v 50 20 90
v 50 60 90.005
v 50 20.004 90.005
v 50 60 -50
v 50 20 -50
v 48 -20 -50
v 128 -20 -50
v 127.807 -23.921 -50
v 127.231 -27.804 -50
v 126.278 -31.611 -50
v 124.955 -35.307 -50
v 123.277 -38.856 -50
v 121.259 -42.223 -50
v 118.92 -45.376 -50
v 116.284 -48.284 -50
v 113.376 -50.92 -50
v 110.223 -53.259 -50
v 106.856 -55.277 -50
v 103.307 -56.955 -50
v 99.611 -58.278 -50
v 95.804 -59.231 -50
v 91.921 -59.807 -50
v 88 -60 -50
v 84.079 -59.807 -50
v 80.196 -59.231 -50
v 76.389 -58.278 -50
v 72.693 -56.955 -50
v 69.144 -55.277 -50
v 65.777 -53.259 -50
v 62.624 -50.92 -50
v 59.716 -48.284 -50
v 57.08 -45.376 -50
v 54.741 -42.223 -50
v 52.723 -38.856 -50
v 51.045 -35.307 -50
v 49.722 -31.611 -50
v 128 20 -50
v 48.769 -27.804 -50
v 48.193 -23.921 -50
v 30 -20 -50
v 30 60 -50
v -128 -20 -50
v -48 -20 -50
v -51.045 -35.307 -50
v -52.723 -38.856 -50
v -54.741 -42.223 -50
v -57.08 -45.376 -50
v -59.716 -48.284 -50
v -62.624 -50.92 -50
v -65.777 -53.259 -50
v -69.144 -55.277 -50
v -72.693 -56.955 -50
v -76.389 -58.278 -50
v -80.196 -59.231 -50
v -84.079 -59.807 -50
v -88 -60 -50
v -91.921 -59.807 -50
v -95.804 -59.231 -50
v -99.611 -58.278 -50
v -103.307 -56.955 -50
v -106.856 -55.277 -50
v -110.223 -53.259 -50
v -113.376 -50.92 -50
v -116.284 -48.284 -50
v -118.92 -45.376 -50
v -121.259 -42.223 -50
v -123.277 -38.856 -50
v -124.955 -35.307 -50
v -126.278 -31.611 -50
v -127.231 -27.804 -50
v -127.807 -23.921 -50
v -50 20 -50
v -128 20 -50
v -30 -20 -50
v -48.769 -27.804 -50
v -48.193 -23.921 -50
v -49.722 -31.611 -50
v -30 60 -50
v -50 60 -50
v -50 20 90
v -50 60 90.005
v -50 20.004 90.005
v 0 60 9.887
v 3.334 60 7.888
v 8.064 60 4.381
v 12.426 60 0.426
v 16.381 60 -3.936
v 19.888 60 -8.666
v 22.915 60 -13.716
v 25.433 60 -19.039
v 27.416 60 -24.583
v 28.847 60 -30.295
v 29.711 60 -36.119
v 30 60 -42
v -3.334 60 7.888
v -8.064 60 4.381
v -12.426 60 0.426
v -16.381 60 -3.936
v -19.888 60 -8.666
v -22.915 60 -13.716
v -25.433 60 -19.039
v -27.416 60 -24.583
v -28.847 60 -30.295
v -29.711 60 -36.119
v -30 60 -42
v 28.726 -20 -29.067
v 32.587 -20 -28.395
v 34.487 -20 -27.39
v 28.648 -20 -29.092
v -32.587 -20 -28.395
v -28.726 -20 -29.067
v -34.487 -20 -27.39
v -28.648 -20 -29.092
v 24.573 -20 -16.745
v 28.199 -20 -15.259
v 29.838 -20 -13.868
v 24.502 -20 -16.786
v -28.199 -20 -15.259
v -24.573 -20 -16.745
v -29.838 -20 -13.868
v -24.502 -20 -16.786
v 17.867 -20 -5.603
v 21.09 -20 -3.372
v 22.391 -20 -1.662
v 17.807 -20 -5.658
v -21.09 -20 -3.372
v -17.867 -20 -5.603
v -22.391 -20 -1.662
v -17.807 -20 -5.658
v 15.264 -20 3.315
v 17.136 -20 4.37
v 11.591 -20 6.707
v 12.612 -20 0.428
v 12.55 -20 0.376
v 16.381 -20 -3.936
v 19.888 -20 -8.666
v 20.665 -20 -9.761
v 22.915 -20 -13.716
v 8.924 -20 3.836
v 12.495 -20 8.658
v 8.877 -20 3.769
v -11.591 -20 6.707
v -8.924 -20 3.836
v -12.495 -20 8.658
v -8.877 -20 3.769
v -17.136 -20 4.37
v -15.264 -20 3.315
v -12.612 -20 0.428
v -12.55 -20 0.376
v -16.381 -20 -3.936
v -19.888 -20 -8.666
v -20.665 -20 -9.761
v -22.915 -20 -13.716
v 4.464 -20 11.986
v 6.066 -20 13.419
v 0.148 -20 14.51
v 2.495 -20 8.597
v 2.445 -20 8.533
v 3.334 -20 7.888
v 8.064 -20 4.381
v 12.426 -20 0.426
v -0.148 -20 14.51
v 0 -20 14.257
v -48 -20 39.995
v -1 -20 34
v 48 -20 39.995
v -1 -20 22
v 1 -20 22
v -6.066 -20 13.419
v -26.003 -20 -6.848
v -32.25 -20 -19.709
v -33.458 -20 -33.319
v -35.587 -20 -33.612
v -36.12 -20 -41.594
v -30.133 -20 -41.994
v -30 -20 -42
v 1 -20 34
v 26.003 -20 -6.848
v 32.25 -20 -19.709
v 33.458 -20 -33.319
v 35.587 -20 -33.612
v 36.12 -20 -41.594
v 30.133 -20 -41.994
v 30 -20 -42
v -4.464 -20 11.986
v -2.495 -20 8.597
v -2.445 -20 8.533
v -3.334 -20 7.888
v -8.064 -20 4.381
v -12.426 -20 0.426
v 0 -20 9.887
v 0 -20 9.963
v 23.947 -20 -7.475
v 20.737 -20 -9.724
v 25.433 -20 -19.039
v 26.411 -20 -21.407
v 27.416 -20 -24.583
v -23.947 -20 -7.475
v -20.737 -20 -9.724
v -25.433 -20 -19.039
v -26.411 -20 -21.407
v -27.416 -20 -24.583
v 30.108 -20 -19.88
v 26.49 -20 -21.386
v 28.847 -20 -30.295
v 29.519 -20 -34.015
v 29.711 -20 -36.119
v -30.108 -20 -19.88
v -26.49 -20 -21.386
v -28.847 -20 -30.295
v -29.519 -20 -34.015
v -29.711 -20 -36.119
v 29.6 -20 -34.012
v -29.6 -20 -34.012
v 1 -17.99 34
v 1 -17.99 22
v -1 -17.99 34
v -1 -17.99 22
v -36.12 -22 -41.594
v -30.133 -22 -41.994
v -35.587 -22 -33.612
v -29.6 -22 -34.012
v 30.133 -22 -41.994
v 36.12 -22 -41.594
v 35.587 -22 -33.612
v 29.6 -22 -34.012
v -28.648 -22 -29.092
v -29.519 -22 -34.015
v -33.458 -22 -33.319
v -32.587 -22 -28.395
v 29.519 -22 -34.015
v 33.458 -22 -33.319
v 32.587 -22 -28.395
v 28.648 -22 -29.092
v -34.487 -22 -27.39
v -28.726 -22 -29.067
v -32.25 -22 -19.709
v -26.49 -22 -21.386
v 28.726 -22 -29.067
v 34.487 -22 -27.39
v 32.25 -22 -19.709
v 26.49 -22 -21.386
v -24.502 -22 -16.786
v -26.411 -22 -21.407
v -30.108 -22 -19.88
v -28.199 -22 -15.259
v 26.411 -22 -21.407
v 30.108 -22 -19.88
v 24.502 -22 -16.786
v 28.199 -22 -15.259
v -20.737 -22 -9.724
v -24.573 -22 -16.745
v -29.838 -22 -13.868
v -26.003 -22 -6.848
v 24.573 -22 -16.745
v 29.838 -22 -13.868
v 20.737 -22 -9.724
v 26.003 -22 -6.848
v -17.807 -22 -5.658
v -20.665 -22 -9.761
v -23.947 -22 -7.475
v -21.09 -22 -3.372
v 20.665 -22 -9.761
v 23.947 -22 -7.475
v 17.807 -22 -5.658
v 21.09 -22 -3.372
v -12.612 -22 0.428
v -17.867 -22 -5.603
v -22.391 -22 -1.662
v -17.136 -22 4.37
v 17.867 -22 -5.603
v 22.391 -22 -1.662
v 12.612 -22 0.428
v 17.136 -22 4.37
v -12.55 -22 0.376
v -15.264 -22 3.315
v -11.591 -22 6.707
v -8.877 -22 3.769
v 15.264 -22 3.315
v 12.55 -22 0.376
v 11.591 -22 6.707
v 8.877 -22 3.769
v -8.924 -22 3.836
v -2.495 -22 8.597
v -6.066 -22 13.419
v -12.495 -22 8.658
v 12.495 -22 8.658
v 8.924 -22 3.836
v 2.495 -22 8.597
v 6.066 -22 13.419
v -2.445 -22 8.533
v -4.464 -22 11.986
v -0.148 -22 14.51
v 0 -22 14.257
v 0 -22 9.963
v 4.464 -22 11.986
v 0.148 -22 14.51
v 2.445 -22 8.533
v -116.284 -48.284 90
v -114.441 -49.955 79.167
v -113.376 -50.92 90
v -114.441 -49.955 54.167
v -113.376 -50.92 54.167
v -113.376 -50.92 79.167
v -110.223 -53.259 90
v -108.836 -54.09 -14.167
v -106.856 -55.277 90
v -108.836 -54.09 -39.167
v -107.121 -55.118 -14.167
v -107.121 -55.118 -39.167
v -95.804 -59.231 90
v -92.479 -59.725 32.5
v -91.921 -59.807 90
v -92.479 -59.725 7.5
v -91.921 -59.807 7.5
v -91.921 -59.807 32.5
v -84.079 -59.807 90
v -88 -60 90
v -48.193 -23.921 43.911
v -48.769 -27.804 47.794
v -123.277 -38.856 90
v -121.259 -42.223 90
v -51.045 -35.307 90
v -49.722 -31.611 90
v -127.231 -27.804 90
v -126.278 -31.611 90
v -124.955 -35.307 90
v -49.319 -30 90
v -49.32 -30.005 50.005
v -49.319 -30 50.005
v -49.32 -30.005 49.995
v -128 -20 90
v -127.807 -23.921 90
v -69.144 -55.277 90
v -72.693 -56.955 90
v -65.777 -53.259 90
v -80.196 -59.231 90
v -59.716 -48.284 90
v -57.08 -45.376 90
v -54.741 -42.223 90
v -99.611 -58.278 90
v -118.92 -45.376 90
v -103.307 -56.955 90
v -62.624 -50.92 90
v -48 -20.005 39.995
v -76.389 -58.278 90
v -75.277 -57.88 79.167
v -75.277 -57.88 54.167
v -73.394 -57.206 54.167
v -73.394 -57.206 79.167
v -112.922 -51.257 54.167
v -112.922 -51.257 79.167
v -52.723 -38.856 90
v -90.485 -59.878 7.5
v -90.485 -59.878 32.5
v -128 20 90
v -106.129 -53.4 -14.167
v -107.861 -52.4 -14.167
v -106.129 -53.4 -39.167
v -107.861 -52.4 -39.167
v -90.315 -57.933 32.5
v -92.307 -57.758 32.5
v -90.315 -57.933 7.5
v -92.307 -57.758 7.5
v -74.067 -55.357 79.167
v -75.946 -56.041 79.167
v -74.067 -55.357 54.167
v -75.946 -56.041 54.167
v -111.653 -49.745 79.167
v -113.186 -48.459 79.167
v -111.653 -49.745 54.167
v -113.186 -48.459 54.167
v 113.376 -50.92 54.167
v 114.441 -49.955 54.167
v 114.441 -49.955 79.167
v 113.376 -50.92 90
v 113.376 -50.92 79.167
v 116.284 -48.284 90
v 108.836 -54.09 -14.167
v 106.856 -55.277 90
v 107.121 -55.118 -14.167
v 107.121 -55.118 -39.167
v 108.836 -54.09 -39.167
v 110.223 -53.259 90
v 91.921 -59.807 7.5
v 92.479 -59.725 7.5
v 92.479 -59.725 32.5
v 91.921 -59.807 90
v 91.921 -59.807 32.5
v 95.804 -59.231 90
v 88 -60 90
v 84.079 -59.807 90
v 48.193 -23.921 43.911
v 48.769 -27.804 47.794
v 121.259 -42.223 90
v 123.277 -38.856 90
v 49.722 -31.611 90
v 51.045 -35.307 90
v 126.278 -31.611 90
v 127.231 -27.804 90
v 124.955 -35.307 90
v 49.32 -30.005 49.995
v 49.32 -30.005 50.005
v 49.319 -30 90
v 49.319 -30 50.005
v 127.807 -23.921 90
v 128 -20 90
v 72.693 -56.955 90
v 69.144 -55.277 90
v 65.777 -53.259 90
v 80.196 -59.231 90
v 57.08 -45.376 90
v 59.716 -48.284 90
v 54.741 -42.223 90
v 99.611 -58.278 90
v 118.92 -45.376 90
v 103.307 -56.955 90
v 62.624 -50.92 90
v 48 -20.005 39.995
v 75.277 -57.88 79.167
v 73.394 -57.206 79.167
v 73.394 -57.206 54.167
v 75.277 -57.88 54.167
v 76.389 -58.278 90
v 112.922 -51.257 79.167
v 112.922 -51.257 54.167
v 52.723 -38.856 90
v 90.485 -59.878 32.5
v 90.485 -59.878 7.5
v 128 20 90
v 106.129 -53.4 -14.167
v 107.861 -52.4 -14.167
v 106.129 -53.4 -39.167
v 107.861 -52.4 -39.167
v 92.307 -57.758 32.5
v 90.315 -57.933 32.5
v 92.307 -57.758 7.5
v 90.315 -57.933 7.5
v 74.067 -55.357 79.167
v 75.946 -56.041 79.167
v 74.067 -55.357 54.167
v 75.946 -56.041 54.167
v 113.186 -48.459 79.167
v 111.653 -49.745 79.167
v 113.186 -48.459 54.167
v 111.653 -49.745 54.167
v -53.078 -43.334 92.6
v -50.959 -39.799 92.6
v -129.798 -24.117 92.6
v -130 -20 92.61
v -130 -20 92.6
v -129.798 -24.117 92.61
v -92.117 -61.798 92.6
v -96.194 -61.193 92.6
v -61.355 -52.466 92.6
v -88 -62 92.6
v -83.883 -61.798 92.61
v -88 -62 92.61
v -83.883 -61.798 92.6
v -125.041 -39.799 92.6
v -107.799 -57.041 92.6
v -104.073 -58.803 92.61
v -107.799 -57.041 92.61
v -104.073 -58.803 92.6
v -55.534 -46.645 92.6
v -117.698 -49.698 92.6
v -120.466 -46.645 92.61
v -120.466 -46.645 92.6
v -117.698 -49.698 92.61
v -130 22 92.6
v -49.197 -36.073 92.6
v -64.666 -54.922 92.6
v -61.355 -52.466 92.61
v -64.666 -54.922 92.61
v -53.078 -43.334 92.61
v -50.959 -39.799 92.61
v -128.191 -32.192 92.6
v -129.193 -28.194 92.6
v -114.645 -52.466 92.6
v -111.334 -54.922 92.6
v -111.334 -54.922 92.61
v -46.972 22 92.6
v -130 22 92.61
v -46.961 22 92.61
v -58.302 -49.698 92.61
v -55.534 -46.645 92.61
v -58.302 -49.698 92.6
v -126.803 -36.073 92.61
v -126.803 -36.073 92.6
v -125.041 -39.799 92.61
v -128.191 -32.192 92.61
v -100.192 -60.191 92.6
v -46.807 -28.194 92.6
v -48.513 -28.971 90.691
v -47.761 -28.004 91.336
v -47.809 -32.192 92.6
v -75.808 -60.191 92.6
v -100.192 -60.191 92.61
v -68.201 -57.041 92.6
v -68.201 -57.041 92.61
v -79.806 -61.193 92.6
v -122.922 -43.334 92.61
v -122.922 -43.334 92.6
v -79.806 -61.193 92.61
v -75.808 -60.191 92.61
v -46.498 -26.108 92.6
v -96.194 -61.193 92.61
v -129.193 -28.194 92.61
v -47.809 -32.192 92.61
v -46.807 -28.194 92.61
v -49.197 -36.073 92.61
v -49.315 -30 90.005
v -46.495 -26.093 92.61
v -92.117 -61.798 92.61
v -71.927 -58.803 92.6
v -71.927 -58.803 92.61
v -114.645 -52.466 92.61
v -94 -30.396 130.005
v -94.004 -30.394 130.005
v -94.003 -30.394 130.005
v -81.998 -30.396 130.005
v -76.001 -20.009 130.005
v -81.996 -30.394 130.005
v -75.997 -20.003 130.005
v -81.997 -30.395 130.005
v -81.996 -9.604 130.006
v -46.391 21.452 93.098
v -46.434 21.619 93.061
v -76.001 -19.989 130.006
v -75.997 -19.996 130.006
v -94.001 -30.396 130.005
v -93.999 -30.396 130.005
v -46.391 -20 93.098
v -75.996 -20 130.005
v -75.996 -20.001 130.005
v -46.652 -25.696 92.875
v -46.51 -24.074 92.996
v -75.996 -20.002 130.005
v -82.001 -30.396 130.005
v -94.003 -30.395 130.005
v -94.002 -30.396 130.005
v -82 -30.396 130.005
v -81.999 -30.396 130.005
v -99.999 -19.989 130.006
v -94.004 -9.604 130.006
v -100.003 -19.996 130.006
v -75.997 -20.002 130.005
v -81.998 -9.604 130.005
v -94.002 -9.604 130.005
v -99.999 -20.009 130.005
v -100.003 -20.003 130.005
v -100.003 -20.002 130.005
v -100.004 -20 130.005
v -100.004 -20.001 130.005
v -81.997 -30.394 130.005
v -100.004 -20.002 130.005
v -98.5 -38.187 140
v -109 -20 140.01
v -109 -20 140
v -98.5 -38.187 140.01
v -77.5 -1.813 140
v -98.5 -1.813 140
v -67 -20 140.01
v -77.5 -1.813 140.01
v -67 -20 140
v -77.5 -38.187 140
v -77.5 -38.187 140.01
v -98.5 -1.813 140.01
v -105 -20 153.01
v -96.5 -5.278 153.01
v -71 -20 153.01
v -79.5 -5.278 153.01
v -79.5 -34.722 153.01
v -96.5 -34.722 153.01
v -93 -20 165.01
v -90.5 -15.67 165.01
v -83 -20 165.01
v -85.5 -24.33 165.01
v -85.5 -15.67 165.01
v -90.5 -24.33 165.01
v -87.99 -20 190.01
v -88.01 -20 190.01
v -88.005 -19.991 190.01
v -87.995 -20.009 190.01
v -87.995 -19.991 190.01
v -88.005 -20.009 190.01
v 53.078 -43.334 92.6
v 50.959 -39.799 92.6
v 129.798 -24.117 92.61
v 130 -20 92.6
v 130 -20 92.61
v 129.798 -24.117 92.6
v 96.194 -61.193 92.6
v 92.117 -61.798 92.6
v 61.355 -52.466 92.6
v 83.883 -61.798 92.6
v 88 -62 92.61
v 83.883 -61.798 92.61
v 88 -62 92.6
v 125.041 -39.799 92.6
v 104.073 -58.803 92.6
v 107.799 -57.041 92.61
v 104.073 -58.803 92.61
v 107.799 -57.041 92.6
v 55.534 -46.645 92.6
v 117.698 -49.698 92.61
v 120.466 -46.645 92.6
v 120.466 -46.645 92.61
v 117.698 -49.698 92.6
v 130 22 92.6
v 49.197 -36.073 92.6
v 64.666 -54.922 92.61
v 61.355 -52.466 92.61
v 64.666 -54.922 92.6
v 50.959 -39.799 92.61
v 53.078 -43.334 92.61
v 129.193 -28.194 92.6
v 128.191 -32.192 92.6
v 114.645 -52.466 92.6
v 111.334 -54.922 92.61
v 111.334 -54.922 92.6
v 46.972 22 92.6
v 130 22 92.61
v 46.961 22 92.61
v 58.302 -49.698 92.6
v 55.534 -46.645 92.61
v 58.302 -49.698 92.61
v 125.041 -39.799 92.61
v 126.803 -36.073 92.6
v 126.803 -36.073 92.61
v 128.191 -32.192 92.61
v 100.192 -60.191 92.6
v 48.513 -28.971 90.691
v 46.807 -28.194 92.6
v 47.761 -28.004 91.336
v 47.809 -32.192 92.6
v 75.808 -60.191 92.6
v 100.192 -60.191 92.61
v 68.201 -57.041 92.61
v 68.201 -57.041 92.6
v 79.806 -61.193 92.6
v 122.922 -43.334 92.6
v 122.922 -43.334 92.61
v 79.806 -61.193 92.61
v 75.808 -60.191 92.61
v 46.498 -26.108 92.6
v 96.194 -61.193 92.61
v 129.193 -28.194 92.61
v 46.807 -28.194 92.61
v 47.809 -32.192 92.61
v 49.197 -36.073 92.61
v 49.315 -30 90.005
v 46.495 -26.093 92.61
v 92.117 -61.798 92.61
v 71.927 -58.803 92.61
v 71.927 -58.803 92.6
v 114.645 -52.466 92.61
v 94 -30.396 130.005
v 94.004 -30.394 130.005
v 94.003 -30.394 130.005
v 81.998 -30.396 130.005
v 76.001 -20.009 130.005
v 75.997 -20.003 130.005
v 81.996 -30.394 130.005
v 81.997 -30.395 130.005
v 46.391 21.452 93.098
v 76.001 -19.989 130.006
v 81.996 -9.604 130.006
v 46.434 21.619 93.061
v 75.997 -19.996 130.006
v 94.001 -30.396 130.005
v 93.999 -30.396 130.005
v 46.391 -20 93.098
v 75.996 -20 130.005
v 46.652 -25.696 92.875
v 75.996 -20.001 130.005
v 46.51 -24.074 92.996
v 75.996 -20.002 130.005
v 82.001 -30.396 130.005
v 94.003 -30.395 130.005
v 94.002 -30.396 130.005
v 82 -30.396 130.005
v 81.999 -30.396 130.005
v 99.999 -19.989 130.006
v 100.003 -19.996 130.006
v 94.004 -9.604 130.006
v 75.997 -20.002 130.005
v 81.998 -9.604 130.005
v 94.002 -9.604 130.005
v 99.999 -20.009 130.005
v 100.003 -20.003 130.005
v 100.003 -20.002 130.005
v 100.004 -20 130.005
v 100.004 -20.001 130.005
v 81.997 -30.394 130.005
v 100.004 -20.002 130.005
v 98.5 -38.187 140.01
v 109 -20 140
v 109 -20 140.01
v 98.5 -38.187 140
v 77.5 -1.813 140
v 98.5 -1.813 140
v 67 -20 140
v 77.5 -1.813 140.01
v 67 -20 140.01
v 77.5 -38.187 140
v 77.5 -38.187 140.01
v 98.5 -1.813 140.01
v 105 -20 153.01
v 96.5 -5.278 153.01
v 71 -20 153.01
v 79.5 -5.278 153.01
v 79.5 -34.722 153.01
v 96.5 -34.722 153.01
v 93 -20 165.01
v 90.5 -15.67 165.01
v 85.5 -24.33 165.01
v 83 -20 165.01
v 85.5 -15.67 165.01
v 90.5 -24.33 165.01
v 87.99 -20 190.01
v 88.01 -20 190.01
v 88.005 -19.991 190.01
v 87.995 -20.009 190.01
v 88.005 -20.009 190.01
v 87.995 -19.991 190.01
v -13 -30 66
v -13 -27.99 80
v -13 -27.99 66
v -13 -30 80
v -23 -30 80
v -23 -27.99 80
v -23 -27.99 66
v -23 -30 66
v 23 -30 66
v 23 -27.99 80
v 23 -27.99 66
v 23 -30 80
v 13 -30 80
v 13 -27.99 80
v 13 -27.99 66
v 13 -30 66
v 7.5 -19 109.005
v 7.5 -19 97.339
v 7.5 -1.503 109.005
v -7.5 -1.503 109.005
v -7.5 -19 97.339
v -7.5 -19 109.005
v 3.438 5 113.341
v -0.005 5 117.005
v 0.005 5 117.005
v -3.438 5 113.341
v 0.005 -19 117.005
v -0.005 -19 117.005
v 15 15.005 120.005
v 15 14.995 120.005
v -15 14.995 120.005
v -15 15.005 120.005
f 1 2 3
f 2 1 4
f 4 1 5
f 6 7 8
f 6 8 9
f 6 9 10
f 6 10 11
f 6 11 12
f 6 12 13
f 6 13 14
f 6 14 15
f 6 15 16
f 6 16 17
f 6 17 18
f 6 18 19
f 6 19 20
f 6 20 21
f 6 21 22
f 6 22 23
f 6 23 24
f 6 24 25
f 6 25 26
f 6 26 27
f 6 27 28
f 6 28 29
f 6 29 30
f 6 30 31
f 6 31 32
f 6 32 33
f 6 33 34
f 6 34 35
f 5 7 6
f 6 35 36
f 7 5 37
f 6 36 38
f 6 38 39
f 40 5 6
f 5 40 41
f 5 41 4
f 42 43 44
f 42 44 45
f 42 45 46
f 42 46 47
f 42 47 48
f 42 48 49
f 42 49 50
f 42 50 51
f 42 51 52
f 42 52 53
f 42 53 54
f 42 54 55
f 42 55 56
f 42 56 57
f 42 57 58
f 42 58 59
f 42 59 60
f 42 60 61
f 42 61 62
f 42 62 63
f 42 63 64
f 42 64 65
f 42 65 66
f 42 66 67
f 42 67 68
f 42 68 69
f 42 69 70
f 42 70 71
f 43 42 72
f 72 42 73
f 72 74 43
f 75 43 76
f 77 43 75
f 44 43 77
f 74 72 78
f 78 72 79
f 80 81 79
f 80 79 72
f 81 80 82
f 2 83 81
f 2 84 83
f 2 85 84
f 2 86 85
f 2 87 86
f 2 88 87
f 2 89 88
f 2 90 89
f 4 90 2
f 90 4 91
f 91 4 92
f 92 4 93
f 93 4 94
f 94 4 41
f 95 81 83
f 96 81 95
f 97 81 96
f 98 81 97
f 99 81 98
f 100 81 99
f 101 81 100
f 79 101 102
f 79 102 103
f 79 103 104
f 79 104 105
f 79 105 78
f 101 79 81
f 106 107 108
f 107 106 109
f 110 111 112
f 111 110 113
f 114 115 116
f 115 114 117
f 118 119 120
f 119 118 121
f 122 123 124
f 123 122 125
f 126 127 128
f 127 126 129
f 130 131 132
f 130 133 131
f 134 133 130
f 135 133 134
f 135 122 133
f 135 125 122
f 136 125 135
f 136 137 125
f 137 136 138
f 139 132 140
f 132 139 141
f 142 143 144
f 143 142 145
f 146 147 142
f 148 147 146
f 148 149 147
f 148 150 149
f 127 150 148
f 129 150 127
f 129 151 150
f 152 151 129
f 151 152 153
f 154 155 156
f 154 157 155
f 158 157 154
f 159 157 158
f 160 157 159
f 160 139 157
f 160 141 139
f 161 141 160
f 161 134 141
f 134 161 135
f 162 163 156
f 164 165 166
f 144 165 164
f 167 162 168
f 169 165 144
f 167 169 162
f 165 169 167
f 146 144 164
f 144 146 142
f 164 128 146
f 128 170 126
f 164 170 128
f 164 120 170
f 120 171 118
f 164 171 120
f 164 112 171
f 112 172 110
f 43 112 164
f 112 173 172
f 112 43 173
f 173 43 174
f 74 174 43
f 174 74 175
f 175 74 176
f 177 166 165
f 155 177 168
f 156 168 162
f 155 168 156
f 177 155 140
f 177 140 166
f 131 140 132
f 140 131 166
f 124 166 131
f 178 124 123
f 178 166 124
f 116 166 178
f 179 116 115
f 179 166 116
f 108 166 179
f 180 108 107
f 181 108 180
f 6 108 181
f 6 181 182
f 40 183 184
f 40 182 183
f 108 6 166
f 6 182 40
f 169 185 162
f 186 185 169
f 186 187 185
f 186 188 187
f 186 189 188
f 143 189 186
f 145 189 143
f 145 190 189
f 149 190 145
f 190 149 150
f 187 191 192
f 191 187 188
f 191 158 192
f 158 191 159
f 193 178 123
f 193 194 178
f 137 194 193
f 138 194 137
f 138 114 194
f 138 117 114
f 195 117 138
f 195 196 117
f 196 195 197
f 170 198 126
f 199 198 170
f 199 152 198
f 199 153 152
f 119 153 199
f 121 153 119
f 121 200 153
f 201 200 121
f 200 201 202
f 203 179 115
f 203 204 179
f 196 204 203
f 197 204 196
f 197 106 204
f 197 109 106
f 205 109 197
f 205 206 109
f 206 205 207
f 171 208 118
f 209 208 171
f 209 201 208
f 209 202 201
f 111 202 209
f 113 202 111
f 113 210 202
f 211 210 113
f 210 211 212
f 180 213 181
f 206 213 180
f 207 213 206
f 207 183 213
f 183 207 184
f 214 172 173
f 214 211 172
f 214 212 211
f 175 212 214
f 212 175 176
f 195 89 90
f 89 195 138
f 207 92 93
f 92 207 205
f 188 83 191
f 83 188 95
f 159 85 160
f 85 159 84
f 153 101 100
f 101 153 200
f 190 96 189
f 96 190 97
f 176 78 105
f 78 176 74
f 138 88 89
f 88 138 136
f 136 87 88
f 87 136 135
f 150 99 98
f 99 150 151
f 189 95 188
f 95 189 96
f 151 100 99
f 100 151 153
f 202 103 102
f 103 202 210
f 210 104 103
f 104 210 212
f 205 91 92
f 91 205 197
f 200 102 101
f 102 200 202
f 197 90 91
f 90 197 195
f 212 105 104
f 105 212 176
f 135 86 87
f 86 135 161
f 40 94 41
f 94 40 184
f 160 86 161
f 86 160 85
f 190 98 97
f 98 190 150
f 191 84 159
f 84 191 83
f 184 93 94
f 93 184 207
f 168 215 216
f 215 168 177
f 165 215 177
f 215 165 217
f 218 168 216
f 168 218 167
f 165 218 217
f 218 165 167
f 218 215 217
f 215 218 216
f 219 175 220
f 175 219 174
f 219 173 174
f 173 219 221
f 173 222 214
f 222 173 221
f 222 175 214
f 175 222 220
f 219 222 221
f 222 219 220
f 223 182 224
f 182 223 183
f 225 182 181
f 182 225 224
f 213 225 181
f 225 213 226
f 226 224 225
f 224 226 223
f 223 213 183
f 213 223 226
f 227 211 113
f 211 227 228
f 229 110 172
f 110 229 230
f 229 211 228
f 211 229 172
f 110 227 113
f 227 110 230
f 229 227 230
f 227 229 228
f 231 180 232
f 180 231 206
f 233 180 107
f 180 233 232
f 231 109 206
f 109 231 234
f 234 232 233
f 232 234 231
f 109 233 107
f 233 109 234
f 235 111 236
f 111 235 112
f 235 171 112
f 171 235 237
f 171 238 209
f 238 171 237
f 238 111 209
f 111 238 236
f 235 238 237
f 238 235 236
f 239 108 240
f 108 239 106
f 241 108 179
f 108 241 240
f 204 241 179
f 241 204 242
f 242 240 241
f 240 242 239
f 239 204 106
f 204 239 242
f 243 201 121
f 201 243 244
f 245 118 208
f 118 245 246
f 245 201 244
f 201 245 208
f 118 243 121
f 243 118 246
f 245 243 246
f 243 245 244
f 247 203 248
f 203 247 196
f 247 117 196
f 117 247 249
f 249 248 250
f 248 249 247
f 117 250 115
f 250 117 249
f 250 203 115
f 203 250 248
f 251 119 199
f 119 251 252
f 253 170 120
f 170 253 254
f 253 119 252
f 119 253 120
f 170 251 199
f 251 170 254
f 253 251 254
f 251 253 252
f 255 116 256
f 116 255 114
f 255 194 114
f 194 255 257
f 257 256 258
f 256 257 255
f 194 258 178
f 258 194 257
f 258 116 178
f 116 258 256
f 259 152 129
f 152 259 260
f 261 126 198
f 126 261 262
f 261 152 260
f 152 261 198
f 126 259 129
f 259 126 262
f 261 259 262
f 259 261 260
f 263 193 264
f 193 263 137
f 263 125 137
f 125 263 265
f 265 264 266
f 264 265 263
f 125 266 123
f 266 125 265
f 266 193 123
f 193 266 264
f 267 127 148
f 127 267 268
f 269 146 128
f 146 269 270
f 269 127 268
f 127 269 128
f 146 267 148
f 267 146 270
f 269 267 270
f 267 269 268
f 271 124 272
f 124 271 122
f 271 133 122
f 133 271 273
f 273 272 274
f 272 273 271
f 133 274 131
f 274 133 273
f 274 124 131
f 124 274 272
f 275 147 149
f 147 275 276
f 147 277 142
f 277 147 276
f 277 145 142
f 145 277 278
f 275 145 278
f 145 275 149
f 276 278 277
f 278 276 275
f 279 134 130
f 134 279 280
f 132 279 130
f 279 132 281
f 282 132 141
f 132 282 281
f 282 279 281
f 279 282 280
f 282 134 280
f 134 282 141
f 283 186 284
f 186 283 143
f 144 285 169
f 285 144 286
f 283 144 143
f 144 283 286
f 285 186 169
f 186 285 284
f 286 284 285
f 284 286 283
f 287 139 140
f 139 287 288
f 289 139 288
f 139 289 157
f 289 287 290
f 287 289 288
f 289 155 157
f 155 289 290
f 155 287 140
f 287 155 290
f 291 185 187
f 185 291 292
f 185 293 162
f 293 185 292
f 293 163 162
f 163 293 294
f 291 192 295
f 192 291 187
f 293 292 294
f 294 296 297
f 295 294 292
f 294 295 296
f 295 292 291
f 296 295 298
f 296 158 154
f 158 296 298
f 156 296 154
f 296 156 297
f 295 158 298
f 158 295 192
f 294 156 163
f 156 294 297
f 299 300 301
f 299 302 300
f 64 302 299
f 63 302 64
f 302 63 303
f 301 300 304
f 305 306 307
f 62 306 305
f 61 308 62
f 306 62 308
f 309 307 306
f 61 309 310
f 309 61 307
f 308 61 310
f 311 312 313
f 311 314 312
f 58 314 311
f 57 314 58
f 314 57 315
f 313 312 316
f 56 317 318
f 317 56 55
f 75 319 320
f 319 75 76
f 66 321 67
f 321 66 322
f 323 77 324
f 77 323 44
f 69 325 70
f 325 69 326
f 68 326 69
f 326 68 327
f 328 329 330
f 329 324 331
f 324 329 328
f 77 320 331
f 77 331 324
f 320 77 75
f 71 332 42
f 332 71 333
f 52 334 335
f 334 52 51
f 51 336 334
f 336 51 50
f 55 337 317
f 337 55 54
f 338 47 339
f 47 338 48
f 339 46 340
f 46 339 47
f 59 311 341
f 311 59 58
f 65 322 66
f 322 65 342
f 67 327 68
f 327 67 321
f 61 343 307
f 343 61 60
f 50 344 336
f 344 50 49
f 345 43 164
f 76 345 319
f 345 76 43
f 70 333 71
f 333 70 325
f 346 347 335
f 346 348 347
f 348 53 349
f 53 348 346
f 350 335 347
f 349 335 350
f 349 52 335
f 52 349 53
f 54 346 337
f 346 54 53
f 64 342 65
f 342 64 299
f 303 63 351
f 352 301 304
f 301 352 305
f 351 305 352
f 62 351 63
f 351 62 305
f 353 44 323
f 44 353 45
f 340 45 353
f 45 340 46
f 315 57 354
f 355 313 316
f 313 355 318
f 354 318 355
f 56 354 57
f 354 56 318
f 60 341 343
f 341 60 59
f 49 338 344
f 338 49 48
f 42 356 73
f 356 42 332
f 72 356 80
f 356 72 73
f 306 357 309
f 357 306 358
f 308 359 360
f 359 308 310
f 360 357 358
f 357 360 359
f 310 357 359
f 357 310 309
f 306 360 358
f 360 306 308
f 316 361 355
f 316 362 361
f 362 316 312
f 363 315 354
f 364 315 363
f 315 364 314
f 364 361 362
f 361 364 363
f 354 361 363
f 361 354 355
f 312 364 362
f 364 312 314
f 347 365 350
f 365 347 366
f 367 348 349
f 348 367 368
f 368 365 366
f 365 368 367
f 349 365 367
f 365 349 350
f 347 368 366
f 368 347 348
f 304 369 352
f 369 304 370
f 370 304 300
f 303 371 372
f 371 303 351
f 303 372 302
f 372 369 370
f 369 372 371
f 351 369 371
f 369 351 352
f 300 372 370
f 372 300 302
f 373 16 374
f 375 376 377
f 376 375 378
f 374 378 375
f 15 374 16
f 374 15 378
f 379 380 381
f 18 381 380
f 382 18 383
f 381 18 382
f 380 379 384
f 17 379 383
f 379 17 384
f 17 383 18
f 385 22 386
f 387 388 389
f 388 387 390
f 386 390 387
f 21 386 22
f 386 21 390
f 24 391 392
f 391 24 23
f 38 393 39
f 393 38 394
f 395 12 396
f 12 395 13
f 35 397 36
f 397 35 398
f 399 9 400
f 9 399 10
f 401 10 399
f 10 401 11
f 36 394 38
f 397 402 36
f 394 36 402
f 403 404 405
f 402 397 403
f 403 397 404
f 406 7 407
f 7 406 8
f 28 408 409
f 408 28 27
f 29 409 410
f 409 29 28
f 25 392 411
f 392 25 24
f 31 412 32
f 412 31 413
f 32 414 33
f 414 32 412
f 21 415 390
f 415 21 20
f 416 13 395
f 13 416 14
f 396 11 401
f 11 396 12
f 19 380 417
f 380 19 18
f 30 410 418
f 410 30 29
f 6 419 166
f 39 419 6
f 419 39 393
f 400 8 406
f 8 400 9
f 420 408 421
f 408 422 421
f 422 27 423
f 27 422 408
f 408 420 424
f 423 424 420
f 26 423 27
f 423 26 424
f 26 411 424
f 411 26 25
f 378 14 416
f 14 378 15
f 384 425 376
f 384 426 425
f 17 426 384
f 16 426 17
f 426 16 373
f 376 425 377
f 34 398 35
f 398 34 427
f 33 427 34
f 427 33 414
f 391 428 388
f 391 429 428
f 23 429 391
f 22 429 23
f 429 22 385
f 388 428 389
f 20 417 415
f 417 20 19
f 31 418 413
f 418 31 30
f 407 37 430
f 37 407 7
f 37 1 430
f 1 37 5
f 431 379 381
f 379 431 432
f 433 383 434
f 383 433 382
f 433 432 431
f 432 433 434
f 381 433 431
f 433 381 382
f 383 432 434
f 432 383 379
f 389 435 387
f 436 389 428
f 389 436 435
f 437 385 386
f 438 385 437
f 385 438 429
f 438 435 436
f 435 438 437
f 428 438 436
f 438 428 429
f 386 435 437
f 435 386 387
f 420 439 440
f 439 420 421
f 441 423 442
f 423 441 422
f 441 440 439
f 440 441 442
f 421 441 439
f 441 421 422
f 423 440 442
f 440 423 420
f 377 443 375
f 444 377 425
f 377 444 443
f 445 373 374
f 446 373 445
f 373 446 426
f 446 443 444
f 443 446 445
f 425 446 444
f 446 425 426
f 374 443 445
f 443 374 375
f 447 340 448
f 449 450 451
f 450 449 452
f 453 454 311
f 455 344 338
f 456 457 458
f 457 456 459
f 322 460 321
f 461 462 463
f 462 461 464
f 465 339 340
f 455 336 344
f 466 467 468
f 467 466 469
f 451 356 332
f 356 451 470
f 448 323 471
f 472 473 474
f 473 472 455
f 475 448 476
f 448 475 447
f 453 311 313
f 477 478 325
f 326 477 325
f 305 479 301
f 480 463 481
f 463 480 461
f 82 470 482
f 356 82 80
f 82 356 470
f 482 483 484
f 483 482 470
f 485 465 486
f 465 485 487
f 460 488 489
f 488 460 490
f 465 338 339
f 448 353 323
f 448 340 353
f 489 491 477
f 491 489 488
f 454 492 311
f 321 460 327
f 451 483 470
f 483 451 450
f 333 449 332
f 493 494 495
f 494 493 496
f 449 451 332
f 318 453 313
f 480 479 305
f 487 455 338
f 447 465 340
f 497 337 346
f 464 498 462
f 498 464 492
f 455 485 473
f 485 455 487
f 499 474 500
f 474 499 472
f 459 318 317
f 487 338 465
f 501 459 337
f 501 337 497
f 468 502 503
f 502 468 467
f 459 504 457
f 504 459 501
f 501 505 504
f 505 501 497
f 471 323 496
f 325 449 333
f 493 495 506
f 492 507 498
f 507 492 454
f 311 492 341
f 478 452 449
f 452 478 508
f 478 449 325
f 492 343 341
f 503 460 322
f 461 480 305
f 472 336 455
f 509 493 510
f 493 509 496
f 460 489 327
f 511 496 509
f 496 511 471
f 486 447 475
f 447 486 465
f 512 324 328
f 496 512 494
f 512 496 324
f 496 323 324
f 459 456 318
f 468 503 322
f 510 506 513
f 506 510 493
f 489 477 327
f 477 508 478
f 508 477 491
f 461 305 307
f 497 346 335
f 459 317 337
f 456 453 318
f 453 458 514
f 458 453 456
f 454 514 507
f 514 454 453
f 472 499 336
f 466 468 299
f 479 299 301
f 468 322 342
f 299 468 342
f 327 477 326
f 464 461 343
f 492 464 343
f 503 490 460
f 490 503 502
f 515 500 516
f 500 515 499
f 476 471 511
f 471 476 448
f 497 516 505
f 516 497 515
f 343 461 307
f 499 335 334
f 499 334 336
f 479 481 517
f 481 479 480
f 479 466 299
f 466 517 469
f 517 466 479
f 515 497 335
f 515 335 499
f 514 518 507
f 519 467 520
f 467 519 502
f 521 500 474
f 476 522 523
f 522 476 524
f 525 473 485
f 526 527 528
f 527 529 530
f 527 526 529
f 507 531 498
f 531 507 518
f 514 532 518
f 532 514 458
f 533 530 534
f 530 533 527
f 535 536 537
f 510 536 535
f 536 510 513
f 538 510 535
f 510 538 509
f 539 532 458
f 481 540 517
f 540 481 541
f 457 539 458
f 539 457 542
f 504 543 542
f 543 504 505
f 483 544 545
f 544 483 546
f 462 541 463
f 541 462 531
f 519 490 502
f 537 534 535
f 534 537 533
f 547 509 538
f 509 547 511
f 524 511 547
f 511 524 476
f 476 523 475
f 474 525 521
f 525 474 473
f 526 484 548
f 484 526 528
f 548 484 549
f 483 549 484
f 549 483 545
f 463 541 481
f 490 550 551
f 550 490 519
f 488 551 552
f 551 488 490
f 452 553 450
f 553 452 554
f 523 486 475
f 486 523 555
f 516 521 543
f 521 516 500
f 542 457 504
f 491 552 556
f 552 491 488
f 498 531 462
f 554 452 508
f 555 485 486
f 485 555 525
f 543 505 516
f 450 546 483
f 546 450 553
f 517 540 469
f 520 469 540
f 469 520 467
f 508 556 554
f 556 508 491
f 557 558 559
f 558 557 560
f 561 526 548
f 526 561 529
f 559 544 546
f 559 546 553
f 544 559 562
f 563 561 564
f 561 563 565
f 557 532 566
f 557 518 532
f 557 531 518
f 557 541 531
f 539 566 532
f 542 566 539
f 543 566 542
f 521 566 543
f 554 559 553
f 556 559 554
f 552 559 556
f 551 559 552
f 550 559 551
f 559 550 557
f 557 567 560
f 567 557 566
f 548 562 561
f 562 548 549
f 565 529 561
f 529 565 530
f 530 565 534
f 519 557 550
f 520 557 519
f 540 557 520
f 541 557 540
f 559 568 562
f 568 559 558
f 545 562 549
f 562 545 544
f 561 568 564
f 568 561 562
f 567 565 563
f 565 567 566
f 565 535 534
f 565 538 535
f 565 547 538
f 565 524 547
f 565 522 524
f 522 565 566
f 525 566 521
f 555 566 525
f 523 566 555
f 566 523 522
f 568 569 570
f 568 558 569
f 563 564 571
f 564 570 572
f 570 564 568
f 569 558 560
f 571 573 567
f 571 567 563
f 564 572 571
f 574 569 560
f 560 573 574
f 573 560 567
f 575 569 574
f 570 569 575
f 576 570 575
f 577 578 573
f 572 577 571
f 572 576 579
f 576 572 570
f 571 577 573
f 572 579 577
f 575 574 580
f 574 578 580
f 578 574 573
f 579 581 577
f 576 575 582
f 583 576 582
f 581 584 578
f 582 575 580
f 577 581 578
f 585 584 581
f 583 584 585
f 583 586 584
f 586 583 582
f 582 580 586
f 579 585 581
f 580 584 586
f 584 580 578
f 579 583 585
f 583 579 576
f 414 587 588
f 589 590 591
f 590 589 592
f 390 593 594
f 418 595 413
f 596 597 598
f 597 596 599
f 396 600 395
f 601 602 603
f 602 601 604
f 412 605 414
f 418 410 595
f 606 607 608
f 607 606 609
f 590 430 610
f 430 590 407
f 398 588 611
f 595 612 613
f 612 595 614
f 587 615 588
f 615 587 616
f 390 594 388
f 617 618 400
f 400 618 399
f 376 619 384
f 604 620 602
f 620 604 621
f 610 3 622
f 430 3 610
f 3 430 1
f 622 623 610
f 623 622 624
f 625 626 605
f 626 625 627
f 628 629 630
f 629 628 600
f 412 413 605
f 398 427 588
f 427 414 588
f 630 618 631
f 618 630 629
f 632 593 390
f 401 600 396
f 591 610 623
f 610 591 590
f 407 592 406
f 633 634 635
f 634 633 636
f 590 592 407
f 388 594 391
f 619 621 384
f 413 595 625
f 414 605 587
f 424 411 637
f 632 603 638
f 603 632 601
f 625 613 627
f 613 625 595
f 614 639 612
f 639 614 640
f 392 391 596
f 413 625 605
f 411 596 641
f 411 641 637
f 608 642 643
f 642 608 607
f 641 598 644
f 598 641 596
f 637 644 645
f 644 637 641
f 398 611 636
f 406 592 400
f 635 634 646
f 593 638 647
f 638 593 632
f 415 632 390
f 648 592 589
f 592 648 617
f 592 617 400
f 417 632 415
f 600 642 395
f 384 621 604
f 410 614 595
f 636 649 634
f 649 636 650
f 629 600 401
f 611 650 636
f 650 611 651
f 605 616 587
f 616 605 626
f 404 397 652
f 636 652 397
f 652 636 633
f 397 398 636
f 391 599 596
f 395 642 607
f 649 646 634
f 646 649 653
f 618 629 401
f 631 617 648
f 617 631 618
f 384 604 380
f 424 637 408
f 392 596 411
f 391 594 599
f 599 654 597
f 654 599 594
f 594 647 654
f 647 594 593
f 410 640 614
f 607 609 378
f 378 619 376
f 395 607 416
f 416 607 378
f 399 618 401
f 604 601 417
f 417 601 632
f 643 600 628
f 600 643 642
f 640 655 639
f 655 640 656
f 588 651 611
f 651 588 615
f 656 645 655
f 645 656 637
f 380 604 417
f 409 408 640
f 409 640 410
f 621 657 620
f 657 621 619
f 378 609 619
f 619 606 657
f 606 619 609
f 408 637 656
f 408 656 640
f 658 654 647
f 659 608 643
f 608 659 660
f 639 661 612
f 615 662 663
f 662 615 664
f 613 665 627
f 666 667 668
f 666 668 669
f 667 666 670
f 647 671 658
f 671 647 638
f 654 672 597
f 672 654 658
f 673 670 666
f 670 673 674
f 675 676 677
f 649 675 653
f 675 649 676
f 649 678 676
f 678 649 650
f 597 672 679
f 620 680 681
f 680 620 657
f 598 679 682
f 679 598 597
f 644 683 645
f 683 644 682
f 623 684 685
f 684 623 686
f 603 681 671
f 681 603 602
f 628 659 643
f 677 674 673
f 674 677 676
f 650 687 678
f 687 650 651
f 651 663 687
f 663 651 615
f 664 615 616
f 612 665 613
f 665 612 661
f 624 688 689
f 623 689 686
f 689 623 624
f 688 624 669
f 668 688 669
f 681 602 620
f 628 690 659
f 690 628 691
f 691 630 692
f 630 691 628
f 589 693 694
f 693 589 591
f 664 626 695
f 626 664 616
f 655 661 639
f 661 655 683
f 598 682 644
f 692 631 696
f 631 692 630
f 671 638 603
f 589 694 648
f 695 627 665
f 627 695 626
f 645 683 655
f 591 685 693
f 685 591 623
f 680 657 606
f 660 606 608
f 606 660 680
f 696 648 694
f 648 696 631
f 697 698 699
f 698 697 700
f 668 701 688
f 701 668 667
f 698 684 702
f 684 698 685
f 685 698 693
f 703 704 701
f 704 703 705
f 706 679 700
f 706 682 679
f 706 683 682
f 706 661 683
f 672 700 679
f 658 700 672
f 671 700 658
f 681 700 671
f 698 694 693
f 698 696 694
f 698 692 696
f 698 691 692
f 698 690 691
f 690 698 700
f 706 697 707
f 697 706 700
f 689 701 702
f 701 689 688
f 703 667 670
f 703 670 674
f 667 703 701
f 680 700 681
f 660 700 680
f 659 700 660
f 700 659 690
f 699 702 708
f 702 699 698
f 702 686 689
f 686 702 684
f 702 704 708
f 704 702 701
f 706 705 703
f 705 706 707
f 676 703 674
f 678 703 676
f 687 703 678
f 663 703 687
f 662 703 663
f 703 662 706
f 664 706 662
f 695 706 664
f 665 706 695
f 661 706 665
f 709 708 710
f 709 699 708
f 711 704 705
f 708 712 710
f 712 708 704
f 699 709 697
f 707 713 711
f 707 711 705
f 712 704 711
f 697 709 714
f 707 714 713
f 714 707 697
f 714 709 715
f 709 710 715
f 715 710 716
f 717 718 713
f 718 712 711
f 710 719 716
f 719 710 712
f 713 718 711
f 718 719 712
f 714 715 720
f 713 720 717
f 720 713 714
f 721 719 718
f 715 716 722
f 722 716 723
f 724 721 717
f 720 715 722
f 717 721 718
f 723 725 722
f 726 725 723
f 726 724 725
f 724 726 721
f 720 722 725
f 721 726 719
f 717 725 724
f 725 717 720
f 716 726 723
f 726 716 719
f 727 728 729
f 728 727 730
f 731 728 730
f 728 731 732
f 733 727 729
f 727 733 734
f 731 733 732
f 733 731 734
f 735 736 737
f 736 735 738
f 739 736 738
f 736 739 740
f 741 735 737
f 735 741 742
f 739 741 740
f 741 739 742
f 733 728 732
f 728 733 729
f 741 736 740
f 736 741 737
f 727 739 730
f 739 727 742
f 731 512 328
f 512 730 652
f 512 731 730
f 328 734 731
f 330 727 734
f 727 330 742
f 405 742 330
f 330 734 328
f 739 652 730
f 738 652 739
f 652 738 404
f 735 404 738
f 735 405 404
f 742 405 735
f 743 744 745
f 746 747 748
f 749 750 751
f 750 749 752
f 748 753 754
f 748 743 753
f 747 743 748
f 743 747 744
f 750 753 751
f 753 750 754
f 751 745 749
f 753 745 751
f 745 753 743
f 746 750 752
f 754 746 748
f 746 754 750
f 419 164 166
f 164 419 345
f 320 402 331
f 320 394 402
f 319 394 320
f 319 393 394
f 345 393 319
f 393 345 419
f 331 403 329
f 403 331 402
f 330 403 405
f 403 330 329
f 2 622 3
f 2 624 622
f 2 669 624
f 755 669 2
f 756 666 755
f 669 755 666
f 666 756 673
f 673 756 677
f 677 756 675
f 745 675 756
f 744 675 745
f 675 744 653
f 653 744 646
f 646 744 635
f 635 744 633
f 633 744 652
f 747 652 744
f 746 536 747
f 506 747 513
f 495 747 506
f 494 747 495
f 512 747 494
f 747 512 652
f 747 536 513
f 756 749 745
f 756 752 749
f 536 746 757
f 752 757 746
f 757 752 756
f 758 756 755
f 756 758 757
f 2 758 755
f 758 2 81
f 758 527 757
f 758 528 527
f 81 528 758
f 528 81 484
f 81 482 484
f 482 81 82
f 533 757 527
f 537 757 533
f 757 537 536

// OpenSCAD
// Quader mit gotischem Spitzbogen-Tunnel

// Quader (unten)
box_w = 100;
box_d = 80;
box_h = 100;
box_y = 20;    // Y-Start (Mitte in Y, 0 = zentriert)

// Quader (oben)
box2_w = 100;
box2_d = 90;
box2_h = 40;
box2_y = 15;   // Y-Start (Mitte in Y, 0 = zentriert)

// Balken (zwischen box und box2)
balken_x = 0;                       // X-Mitte
balken_y = -25;   // Y-Mitte
balken_z = 45;   // Z-Mitte (liegt auf Oberkante box)
balken_w = box_w;                   // Breite (X)
balken_d = 10;                  // Tiefe  (Y)
balken_h = 10;                       // Höhe   (Z)


// Walmdach (trapezförmig)
roof_w       = 100;  // Breite (default = box2_w)
roof_d       = 90;   // Tiefe  (default = box2_d)
roof_h       = 30;   // Firsthöhe
roof_ridge_l = 30;   // Firstlänge (0 = Pyramide)

// Türme (Zylinder links/rechts)
tower_r  = 40;   // Radius
tower_h  = 140;  // Höhe
tower_x  = box_w/2 + 38;  // X-Offset (bündig am Quader)
tower_y  = -20;  // Y-Versatz
tower_z  = 20;   // Z-Versatz (Mitte des Zylinders)

// Schießschächte der Türme (3 Ebenen, oberste hat 2 Schächte)
slit_ang_start = 240;  // Startwinkel Ebene 0 (vorne = -Y)
slit_ang_step  = 25;   // Winkelversatz pro Ebene
slit_top_gap   = 60;   // Winkelabstand der 2 Schächte auf Ebene 3

// Turmdach (unten: rund → Sechseck, oben: Sechseck → Spitze)
tr_r1 = 42;   // Basisradius (etwas größer als Turm)
tr_r2 = 12;   // Radius am Übergang Unter-/Oberteil
tr_h1 = 40;   // Höhe Unterteil
tr_h2 = 60;   // Höhe Oberteil

// Spitzen-Profil: 3 Kontrollpunkte (Radius / Z-Position)
tr_p1_r = 21;  tr_p1_z = 10;
tr_p2_r = 17;  tr_p2_z = 23;
tr_p3_r =  5;  tr_p3_z = 35;

// Dachgaube
dg_w  = 15;   // Breite
dg_h  = 12;   // Höhe Quader
dg_d  =  24;   // Tiefe
dg_rh =  8;   // Höhe Dreieckdach
dg_y  = -7;  // Y-Position
dg_z  = 97;   // Z-Position (Unterkante)

// Box2-Fenster vorne (zwei rechteckige Nischen nebeneinander)
b2win_w     = 10;  // Breite je Fenster
b2win_h     = 14;  // Höhe je Fenster
b2win_gap   = 26;  // Abstand zwischen den beiden Fenstern
b2win_depth =  2;  // Eintiefung (max 2)
b2win_z     = 16;  // Z-Unterkante

// Tunnel
arch_span = 60;
arch_leg  = 10;
arch_r    = arch_span;

// Voussoirs (Bogensteine)
stone_n       = 10;   // Steine pro Bogenhälfte
stone_depth   = 2;   // Vorstand von der Vorderfläche
stone_h_big   = 6;   // radiale Dicke, großer Stein
stone_h_small = 4;   // radiale Dicke, kleiner Stein
stone_w_big   = 8;   // Breite entlang Bogen, großer Stein
stone_w_small = 5;   // Breite, kleiner Stein

// Schießschacht-Fenster (8 Steine: 3 links + 3 rechts + 1 oben + 1 unten)
win_z      = 28;   // Z-Mitte des Fensters
win_gap_w  = 2;    // freier Abstand zwischen linken und rechten Steinen
win_depth  = 2;    // Vorstand von der Vorderfläche
win_height = 12;

fr_h_big   = 5;
fr_h_small = 5;
fr_w_big   = 7;
fr_w_small = 5;
fr_n       = 3;    // Steine pro Seite → gesamt 3+3+1+1 = 8

function fr_h_at(i)  = (i % 2 == 0) ? fr_h_big  : fr_h_small;
function fr_w_at(i)  = (i % 2 == 0) ? fr_w_big  : fr_w_small;
function fr_cum_h(i) = (i == 0) ? 0 : fr_cum_h(i-1) + fr_h_at(i-1);

// ── Hilfsfunktionen: Breite/Höhe/Winkel pro Stein ────────────────────────────
function stone_w_at(i)   = (i % 2 == 0) ? stone_w_big   : stone_w_small;
function stone_h_at(i)   = (i % 2 == 0) ? stone_h_big   : stone_h_small;
function stone_ang_at(i) = stone_w_at(i) / arch_r * (180/PI);
function cum_ang(i)      = (i == 0) ? 0 : cum_ang(i-1) + stone_ang_at(i-1);

// ── Spitzbogen-Profil ─────────────────────────────────────────────────────────
module arch_2d(span, leg_h, r) {
    arch_tip_h = sqrt(r*r - (span/2)*(span/2));
    union() {
        translate([-span/2, 0])
            square([span, leg_h]);
        translate([0, leg_h])
        intersection() {
            translate([-span/2, 0]) circle(r=r, $fn=64);
            translate([ span/2, 0]) circle(r=r, $fn=64);
            translate([-r, 0]) square([2*r, arch_tip_h + 1]);
        }
    }
}

// ── Ein einzelner Voussoir ───────────────────────────────────────────────────
module stone_at(cx, cz, alpha_deg, h, w, depth, front_y) {
    sx = cx + arch_r * cos(alpha_deg);
    sz = cz + arch_r * sin(alpha_deg);
    translate([sx, front_y - depth/2, sz])
    rotate([0, -alpha_deg, 0])
    translate([h/2, 0, 0])
    cube([h, depth, w], center=true);
}

// ── Voussoir-Verzierung (Vorderseite) ────────────────────────────────────────
module arch_verzierung() {
    cr_x = arch_span/2;
    c_z  = arch_leg - box_h/2 - 2;
    fy   = -box_d/2;

    for (i = [0:stone_n-1]) {
        ang = 180 - cum_ang(i) - stone_ang_at(i)/2;
        stone_at(cr_x, c_z, ang, stone_h_at(i), stone_w_at(i), stone_depth, fy);
        mirror([1, 0, 0])
        stone_at(cr_x, c_z, ang, stone_h_at(i), stone_w_at(i), stone_depth, fy);
    }
}

// ── Schießschacht-Rahmensteine ────────────────────────────────────────────────
module fenster_rahmen() {
    fy      = -box_d/2;
    total_h = fr_cum_h(fr_n);
    z_start = win_z - total_h/2;
    cap_w   = win_gap_w + fr_w_big * 2;

    // 3 Seitensteine links und rechts (big-small-big)
    for (i = [0:fr_n-1]) {
        h   = fr_h_at(i);
        w   = fr_w_at(i);
        z_c = z_start + fr_cum_h(i) + h/2;
        for (side = [-1, 1])
            translate([side * (win_gap_w/2 + w/2), fy - win_depth/2, z_c])
            cube([w, win_depth, h], center=true);
    }

    // 1 Stein oben (breiter Abschluss)
    translate([0, fy - win_depth/2, z_start + total_h + fr_h_big/2])
        cube([cap_w, win_depth, fr_h_big], center=true);

    // 1 Stein unten
    translate([0, fy - win_depth/2, z_start - fr_h_small/2])
        cube([cap_w, win_depth, fr_h_small], center=true);
}

// ── Turm-Schießschacht: ein Rahmen auf der Zylinderoberfläche ─────────────────
module turm_koerper() {
    color("green")
    cylinder(r=tower_r, h=tower_h, center=true, $fn=64);
    // Rückseite: Quader von Mitte nach hinten (+Y)
    translate([-tower_r, 0, -tower_h/2])
        cube([2*tower_r, tower_r, tower_h]);
}

module turm_slit_at(ang, z_ctr) {
    total_h = fr_cum_h(fr_n) + fr_h_big + fr_h_small;
    rotate([0, 0, ang])
    translate([tower_r - win_depth/2, 0, z_ctr])
        cube([win_depth + 0.02, win_gap_w, total_h], center=true);
}

module turm_schlitze() {
    for (i = [0:2]) {
        turm_slit_at(slit_ang_start + i * slit_ang_step, -tower_h/3 + i * tower_h/3);
    }
    // 2. Schacht auf oberster Ebene (Winkel via slit_top_gap versetzt)
    turm_slit_at(slit_ang_start + 2*slit_ang_step - slit_top_gap, tower_h/3);
}

// ── Turmdach (Kreis → Sechseck → Kugel → Spitze) ────────────────────────────
module turmdach_spitze(r_base, h) {

    profile = [
        [r_base,  0      ],
        [tr_p1_r, tr_p1_z],
        [tr_p2_r, tr_p2_z],
        [tr_p3_r, tr_p3_z],
        [0.01,    h      ],
    ];
    for (i = [0:len(profile)-2]) {
        r0 = profile[i][0];    z0 = profile[i][1];
        r1 = profile[i+1][0];  z1 = profile[i+1][1];
        translate([0, 0, z0])
        hull() {
            cylinder(r=r0, h=0.01, $fn=6);
            translate([0, 0, z1-z0])
                cylinder(r=r1, h=0.01, $fn=6);
        }
    }
}

// D-förmiger Fuß (Zylinder + Rückseite) als dünne Scheibe bei Radius r
module turmdach_dscheibe(r) {
    cylinder(r=r, h=0.01, $fn=64);
    translate([-r, 0, 0])
        cube([2*r, r, 0.01]);
}

module turmdach(r1, r2, h1, h2) {
    base_r = tower_r;                 // Fuß bündig mit dem Turm → kein Überhang
    cham_h = (r1 - base_r) * 1.3;     // Fasenhöhe (~52° Unterseite, kein Support)
    color("red") {
        // Traufen-Fase: schräg vom Turmradius hoch zur Traufe (druckbar)
        hull() {
            turmdach_dscheibe(base_r );
            translate([0, 0, cham_h]) turmdach_dscheibe(r1);
        }
        // Hauptkegel: Traufe → Sechseck oben
        translate([0, 0, cham_h])
        hull() {
            turmdach_dscheibe(r1);
            translate([0, 0, h1 - cham_h])
                cylinder(r=r2, h=0.01, $fn=6);
        }
    }
    // Oberteil: sechseckige Kontur → Spitze
    translate([0, 0, h1])
        turmdach_spitze(r2, h2);
}

// ── Dachgaube (Quader + Satteldach) ──────────────────────────────────────────
module dachgaube(w, h, d, rh) {
    cube([w, d, h], center=true);
    translate([0, 0, h/2])
    hull() {
        cube([w, d, 0.01], center=true);
        translate([0, 0, rh])
            cube([0.01, d, 0.01], center=true);
    }
}

// ── Kehlleiste: Viertelkreis-Profil ──────────────────────────────────────────
module kehlleiste_profil(r) {
    difference() {
        square(r * 2);
        circle(r);
    }
}

// ── Box2-Fenster: zwei rechteckige Nischen nebeneinander ─────────────────────
module fenster_box2_paar() {
    // intersection: zwei tiefe Schlitze × Tiefenbegrenzer = max b2win_depth tief
    intersection() {
        union() {
            translate([-(b2win_gap/2 + b2win_w), -0.01, 0])
                cube([b2win_w, 100, b2win_h]);
            translate([b2win_gap/2, -0.01, 0])
                cube([b2win_w, 100, b2win_h]);
        }
        translate([-(b2win_gap/2 + b2win_w) - 1, -0.01, -1])
            cube([2*b2win_w + b2win_gap + 2, b2win_depth + 0.02, b2win_h + 2]);
    }
}


// ── Walmdach ──────────────────────────────────────────────────────────────────
module walmdach(w, d, h, ridge_l) {
    hull() {
        cube([w, d, 0.01], center=true);
        translate([0, 0, h])
            cube([max(ridge_l, 0.01), 0.01, 0.01], center=true);
    }
}


// ── Balken (45°-Fase als Stützersatz für den Überhang) ───────────────────────
// Gerader Keil statt rundem Zylinderschnitt: die Unterseite läuft mit
// konstanter Neigung von der box-Vorderkante hoch zur box2-Vorderkante,
// dadurch nirgends flacher als die Druckbarkeitsgrenze (kein Support nötig).
module balken(x, y, z, w, d, h) {
    yb = y + d/2;   // box-Seite  (hinten, +Y)
    yf = y - d/2;   // box2-Seite (vorne,  -Y, Überhangkante)
    zb = z - h/2;   // unten
    zt = z + h/2;   // oben (Unterkante box2)
    eps = 0.01;
    color("lightblue")
    hull() {
        translate([x, yb, zb]) cube([w, eps, eps], center=true); // Fuß an box
        translate([x, yb, zt]) cube([w, eps, eps], center=true); // hintere Oberkante
        translate([x, yf, zt]) cube([w, eps, eps], center=true); // vordere Oberkante (trägt box2)
    }
}

// ── Szene ─────────────────────────────────────────────────────────────────────
translate([0, box_y, 0]) {
    difference() {
        cube([box_w, box_d, box_h], true);
        translate([0, box_d/2 + 2, -box_h/2 - 2])
        rotate([90, 0, 0])
        linear_extrude(box_d + 5)
        arch_2d(arch_span, arch_leg, arch_r);
        // Schießschacht vorne (bündig, 2 tief)
        translate([0, -box_d/2 + win_depth/2, win_z])
            cube([win_gap_w, win_depth + 0.02, win_height], center=true);
    }
    arch_verzierung();
}

// Balken Rundung zwischen box und box2
balken(balken_x, balken_y, balken_z, balken_w, balken_d, balken_h);

// Türme
translate([-tower_x, tower_y, tower_z]) {
    difference() {
        turm_koerper();
        turm_schlitze();
    }
}
mirror([1, 0, 0])
translate([-tower_x, tower_y, tower_z]) {
    difference() {
        turm_koerper();
        turm_schlitze();
    }
}

// Turmdächer
translate([-tower_x, tower_y, tower_z + tower_h/2])
    turmdach(tr_r1, tr_r2, tr_h1, tr_h2);
mirror([1, 0, 0])
translate([-tower_x, tower_y, tower_z + tower_h/2])
    turmdach(tr_r1, tr_r2, tr_h1, tr_h2);


// Quader oben mit Fensternischen
translate([0, box2_y, box_h/2 + box2_h/2])
difference() {
    cube([box2_w, box2_d, box2_h], true);
    // Vorderfenster: 1 Ebene
    translate([0, -box2_d/2, b2win_z - box2_h/2])
        fenster_box2_paar();
}

// Dach
translate([0, box2_y, box_h/2 + box2_h])
    walmdach(roof_w, roof_d, roof_h, roof_ridge_l);

// Dachgaube
translate([0, dg_y, dg_z + dg_h/2])
    dachgaube(dg_w, dg_h, dg_d, dg_rh);
